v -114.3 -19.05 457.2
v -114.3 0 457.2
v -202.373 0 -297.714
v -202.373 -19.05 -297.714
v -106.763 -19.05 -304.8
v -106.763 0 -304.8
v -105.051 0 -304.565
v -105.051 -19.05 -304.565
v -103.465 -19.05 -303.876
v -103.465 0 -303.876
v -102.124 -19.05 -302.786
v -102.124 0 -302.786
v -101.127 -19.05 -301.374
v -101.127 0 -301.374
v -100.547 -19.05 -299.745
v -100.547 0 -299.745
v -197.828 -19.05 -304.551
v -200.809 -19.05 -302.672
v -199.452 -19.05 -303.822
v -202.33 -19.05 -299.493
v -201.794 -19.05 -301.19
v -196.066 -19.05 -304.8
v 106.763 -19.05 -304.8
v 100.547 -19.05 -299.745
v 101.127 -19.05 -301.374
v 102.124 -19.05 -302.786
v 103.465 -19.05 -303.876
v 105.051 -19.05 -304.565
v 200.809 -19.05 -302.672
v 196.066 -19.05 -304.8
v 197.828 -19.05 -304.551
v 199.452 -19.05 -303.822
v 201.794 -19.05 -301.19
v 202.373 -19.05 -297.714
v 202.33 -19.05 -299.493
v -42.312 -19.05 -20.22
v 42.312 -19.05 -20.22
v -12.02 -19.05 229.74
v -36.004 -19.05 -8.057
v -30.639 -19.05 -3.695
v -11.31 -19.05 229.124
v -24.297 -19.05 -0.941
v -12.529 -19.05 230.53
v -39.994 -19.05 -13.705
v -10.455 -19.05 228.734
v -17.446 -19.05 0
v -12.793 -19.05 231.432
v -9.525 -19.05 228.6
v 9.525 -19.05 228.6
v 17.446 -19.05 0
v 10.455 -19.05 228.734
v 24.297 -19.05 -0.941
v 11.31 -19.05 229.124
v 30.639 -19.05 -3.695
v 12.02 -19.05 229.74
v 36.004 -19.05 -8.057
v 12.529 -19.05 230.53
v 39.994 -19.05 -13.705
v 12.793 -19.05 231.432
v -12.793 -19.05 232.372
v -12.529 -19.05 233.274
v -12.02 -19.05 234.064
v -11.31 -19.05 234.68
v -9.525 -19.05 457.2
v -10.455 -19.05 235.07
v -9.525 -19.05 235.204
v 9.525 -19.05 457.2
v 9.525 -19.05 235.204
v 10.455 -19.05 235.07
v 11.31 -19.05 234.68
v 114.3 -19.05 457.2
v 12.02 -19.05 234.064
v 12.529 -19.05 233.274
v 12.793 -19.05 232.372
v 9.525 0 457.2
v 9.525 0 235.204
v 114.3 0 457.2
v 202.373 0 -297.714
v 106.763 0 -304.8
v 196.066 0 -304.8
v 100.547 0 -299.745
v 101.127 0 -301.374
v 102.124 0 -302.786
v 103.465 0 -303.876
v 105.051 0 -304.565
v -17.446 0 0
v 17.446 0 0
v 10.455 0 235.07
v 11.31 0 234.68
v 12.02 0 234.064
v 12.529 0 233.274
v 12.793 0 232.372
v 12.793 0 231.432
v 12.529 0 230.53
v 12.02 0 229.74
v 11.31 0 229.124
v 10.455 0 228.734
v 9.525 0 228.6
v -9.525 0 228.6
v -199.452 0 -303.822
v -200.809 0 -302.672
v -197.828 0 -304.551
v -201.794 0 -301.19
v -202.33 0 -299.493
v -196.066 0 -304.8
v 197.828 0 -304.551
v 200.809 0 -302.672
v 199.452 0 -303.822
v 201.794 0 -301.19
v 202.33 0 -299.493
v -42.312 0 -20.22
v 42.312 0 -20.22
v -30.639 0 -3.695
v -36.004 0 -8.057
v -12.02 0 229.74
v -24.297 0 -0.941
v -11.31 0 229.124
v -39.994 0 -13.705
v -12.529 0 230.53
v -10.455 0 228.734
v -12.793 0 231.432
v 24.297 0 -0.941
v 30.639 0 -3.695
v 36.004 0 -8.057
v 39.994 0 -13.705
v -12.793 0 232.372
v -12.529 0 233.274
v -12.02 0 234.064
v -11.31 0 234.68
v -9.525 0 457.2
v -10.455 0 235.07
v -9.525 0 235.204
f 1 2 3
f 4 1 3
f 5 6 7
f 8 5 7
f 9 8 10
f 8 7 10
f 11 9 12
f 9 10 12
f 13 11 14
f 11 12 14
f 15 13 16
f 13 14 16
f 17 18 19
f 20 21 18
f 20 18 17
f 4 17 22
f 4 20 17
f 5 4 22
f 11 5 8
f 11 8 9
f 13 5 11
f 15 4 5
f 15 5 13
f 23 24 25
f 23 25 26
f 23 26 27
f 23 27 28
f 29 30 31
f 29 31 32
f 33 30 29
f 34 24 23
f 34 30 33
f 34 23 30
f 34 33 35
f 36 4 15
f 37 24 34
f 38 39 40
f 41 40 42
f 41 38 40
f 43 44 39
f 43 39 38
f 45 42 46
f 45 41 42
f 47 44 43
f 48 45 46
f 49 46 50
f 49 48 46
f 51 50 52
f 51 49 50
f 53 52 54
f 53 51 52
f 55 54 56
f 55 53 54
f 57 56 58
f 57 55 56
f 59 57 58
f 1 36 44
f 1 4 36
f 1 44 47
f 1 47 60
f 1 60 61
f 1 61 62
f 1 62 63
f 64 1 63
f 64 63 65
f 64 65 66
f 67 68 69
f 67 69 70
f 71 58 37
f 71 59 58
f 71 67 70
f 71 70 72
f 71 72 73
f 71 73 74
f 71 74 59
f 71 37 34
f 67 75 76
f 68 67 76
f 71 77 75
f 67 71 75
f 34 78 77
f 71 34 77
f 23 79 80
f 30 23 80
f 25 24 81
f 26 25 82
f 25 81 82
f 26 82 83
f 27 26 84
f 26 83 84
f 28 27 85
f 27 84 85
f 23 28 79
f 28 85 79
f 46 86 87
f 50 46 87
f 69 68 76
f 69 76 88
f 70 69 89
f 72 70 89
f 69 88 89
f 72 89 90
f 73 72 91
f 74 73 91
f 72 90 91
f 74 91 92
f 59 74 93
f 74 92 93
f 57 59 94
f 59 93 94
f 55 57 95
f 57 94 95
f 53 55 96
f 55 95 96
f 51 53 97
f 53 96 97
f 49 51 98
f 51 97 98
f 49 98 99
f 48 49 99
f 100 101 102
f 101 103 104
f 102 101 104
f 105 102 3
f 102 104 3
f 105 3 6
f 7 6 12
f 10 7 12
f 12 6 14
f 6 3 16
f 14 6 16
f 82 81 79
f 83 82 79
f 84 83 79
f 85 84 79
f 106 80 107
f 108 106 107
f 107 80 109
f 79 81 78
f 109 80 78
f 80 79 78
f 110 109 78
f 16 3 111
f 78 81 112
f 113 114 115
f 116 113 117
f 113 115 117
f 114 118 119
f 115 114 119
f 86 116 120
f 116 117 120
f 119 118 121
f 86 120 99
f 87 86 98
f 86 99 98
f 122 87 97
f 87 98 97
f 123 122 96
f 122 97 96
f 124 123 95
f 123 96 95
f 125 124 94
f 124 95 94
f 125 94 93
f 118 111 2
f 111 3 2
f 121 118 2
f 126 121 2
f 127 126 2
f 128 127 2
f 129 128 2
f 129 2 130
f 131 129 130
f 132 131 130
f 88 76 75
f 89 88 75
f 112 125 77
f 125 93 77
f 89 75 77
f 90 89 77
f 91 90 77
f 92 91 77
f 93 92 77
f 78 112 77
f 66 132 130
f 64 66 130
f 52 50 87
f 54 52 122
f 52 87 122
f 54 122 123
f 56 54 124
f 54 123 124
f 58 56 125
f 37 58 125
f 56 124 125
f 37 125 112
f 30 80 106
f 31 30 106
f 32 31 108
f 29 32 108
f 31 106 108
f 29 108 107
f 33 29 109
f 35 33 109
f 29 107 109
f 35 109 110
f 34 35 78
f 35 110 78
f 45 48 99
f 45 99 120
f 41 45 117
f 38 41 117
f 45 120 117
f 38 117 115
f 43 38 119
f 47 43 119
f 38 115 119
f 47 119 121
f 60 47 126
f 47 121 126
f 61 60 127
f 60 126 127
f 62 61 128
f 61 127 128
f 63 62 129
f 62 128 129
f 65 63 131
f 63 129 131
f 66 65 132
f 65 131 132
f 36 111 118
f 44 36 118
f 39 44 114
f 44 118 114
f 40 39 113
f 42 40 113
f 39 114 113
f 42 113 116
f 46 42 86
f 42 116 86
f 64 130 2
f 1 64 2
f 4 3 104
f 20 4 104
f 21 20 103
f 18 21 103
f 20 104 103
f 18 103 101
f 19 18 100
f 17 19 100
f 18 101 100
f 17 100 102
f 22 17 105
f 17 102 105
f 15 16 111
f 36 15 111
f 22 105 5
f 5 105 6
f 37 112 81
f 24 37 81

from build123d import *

# Parameters (mm, degrees)
F1_DEPTH = 19.05


with BuildPart() as f1:
    # F0 (on Front) → F1 (new body)
    with BuildSketch(Plane.XZ):
        with BuildLine():
            Line((-114.3, 457.2), (-202.373318, -297.714158))
            ThreePointArc((-202.373318, -297.714158), (-200.809256, -302.67196), (-196.066097, -304.8))
            Line((-196.066097, -304.8), (-106.763423, -304.8))
            ThreePointArc((-106.763423, -304.8), (-102.757269, -303.376786), (-100.546898, -299.74511))
            Line((-100.546898, -299.74511), (-42.312409, -20.219562))
            ThreePointArc((-42.312409, -20.219562), (-33.470926, -5.692855), (-17.446306, 0))
            Line((-17.446306, 0), (17.446306, 0))
            ThreePointArc((17.446306, 0), (33.470926, -5.692855), (42.312409, -20.219562))
            Line((42.312409, -20.219562), (100.546898, -299.74511))
            ThreePointArc((100.546898, -299.74511), (102.757269, -303.376786), (106.763423, -304.8))
            Line((106.763423, -304.8), (196.066097, -304.8))
            ThreePointArc((196.066097, -304.8), (200.809256, -302.67196), (202.373318, -297.714158))
            Line((202.373318, -297.714158), (114.3, 457.2))
            Line((114.3, 457.2), (9.525, 457.2))
            Line((9.525, 457.2), (9.525, 235.204))
            ThreePointArc((9.525, 235.204), (12.827, 231.902), (9.525, 228.6))
            Line((9.525, 228.6), (-9.525, 228.6))
            ThreePointArc((-9.525, 228.6), (-12.827, 231.902), (-9.525, 235.204))
            Line((-9.525, 235.204), (-9.525, 457.2))
            Line((-9.525, 457.2), (-114.3, 457.2))
        make_face()
    extrude(amount=F1_DEPTH)


solid = f1.part
